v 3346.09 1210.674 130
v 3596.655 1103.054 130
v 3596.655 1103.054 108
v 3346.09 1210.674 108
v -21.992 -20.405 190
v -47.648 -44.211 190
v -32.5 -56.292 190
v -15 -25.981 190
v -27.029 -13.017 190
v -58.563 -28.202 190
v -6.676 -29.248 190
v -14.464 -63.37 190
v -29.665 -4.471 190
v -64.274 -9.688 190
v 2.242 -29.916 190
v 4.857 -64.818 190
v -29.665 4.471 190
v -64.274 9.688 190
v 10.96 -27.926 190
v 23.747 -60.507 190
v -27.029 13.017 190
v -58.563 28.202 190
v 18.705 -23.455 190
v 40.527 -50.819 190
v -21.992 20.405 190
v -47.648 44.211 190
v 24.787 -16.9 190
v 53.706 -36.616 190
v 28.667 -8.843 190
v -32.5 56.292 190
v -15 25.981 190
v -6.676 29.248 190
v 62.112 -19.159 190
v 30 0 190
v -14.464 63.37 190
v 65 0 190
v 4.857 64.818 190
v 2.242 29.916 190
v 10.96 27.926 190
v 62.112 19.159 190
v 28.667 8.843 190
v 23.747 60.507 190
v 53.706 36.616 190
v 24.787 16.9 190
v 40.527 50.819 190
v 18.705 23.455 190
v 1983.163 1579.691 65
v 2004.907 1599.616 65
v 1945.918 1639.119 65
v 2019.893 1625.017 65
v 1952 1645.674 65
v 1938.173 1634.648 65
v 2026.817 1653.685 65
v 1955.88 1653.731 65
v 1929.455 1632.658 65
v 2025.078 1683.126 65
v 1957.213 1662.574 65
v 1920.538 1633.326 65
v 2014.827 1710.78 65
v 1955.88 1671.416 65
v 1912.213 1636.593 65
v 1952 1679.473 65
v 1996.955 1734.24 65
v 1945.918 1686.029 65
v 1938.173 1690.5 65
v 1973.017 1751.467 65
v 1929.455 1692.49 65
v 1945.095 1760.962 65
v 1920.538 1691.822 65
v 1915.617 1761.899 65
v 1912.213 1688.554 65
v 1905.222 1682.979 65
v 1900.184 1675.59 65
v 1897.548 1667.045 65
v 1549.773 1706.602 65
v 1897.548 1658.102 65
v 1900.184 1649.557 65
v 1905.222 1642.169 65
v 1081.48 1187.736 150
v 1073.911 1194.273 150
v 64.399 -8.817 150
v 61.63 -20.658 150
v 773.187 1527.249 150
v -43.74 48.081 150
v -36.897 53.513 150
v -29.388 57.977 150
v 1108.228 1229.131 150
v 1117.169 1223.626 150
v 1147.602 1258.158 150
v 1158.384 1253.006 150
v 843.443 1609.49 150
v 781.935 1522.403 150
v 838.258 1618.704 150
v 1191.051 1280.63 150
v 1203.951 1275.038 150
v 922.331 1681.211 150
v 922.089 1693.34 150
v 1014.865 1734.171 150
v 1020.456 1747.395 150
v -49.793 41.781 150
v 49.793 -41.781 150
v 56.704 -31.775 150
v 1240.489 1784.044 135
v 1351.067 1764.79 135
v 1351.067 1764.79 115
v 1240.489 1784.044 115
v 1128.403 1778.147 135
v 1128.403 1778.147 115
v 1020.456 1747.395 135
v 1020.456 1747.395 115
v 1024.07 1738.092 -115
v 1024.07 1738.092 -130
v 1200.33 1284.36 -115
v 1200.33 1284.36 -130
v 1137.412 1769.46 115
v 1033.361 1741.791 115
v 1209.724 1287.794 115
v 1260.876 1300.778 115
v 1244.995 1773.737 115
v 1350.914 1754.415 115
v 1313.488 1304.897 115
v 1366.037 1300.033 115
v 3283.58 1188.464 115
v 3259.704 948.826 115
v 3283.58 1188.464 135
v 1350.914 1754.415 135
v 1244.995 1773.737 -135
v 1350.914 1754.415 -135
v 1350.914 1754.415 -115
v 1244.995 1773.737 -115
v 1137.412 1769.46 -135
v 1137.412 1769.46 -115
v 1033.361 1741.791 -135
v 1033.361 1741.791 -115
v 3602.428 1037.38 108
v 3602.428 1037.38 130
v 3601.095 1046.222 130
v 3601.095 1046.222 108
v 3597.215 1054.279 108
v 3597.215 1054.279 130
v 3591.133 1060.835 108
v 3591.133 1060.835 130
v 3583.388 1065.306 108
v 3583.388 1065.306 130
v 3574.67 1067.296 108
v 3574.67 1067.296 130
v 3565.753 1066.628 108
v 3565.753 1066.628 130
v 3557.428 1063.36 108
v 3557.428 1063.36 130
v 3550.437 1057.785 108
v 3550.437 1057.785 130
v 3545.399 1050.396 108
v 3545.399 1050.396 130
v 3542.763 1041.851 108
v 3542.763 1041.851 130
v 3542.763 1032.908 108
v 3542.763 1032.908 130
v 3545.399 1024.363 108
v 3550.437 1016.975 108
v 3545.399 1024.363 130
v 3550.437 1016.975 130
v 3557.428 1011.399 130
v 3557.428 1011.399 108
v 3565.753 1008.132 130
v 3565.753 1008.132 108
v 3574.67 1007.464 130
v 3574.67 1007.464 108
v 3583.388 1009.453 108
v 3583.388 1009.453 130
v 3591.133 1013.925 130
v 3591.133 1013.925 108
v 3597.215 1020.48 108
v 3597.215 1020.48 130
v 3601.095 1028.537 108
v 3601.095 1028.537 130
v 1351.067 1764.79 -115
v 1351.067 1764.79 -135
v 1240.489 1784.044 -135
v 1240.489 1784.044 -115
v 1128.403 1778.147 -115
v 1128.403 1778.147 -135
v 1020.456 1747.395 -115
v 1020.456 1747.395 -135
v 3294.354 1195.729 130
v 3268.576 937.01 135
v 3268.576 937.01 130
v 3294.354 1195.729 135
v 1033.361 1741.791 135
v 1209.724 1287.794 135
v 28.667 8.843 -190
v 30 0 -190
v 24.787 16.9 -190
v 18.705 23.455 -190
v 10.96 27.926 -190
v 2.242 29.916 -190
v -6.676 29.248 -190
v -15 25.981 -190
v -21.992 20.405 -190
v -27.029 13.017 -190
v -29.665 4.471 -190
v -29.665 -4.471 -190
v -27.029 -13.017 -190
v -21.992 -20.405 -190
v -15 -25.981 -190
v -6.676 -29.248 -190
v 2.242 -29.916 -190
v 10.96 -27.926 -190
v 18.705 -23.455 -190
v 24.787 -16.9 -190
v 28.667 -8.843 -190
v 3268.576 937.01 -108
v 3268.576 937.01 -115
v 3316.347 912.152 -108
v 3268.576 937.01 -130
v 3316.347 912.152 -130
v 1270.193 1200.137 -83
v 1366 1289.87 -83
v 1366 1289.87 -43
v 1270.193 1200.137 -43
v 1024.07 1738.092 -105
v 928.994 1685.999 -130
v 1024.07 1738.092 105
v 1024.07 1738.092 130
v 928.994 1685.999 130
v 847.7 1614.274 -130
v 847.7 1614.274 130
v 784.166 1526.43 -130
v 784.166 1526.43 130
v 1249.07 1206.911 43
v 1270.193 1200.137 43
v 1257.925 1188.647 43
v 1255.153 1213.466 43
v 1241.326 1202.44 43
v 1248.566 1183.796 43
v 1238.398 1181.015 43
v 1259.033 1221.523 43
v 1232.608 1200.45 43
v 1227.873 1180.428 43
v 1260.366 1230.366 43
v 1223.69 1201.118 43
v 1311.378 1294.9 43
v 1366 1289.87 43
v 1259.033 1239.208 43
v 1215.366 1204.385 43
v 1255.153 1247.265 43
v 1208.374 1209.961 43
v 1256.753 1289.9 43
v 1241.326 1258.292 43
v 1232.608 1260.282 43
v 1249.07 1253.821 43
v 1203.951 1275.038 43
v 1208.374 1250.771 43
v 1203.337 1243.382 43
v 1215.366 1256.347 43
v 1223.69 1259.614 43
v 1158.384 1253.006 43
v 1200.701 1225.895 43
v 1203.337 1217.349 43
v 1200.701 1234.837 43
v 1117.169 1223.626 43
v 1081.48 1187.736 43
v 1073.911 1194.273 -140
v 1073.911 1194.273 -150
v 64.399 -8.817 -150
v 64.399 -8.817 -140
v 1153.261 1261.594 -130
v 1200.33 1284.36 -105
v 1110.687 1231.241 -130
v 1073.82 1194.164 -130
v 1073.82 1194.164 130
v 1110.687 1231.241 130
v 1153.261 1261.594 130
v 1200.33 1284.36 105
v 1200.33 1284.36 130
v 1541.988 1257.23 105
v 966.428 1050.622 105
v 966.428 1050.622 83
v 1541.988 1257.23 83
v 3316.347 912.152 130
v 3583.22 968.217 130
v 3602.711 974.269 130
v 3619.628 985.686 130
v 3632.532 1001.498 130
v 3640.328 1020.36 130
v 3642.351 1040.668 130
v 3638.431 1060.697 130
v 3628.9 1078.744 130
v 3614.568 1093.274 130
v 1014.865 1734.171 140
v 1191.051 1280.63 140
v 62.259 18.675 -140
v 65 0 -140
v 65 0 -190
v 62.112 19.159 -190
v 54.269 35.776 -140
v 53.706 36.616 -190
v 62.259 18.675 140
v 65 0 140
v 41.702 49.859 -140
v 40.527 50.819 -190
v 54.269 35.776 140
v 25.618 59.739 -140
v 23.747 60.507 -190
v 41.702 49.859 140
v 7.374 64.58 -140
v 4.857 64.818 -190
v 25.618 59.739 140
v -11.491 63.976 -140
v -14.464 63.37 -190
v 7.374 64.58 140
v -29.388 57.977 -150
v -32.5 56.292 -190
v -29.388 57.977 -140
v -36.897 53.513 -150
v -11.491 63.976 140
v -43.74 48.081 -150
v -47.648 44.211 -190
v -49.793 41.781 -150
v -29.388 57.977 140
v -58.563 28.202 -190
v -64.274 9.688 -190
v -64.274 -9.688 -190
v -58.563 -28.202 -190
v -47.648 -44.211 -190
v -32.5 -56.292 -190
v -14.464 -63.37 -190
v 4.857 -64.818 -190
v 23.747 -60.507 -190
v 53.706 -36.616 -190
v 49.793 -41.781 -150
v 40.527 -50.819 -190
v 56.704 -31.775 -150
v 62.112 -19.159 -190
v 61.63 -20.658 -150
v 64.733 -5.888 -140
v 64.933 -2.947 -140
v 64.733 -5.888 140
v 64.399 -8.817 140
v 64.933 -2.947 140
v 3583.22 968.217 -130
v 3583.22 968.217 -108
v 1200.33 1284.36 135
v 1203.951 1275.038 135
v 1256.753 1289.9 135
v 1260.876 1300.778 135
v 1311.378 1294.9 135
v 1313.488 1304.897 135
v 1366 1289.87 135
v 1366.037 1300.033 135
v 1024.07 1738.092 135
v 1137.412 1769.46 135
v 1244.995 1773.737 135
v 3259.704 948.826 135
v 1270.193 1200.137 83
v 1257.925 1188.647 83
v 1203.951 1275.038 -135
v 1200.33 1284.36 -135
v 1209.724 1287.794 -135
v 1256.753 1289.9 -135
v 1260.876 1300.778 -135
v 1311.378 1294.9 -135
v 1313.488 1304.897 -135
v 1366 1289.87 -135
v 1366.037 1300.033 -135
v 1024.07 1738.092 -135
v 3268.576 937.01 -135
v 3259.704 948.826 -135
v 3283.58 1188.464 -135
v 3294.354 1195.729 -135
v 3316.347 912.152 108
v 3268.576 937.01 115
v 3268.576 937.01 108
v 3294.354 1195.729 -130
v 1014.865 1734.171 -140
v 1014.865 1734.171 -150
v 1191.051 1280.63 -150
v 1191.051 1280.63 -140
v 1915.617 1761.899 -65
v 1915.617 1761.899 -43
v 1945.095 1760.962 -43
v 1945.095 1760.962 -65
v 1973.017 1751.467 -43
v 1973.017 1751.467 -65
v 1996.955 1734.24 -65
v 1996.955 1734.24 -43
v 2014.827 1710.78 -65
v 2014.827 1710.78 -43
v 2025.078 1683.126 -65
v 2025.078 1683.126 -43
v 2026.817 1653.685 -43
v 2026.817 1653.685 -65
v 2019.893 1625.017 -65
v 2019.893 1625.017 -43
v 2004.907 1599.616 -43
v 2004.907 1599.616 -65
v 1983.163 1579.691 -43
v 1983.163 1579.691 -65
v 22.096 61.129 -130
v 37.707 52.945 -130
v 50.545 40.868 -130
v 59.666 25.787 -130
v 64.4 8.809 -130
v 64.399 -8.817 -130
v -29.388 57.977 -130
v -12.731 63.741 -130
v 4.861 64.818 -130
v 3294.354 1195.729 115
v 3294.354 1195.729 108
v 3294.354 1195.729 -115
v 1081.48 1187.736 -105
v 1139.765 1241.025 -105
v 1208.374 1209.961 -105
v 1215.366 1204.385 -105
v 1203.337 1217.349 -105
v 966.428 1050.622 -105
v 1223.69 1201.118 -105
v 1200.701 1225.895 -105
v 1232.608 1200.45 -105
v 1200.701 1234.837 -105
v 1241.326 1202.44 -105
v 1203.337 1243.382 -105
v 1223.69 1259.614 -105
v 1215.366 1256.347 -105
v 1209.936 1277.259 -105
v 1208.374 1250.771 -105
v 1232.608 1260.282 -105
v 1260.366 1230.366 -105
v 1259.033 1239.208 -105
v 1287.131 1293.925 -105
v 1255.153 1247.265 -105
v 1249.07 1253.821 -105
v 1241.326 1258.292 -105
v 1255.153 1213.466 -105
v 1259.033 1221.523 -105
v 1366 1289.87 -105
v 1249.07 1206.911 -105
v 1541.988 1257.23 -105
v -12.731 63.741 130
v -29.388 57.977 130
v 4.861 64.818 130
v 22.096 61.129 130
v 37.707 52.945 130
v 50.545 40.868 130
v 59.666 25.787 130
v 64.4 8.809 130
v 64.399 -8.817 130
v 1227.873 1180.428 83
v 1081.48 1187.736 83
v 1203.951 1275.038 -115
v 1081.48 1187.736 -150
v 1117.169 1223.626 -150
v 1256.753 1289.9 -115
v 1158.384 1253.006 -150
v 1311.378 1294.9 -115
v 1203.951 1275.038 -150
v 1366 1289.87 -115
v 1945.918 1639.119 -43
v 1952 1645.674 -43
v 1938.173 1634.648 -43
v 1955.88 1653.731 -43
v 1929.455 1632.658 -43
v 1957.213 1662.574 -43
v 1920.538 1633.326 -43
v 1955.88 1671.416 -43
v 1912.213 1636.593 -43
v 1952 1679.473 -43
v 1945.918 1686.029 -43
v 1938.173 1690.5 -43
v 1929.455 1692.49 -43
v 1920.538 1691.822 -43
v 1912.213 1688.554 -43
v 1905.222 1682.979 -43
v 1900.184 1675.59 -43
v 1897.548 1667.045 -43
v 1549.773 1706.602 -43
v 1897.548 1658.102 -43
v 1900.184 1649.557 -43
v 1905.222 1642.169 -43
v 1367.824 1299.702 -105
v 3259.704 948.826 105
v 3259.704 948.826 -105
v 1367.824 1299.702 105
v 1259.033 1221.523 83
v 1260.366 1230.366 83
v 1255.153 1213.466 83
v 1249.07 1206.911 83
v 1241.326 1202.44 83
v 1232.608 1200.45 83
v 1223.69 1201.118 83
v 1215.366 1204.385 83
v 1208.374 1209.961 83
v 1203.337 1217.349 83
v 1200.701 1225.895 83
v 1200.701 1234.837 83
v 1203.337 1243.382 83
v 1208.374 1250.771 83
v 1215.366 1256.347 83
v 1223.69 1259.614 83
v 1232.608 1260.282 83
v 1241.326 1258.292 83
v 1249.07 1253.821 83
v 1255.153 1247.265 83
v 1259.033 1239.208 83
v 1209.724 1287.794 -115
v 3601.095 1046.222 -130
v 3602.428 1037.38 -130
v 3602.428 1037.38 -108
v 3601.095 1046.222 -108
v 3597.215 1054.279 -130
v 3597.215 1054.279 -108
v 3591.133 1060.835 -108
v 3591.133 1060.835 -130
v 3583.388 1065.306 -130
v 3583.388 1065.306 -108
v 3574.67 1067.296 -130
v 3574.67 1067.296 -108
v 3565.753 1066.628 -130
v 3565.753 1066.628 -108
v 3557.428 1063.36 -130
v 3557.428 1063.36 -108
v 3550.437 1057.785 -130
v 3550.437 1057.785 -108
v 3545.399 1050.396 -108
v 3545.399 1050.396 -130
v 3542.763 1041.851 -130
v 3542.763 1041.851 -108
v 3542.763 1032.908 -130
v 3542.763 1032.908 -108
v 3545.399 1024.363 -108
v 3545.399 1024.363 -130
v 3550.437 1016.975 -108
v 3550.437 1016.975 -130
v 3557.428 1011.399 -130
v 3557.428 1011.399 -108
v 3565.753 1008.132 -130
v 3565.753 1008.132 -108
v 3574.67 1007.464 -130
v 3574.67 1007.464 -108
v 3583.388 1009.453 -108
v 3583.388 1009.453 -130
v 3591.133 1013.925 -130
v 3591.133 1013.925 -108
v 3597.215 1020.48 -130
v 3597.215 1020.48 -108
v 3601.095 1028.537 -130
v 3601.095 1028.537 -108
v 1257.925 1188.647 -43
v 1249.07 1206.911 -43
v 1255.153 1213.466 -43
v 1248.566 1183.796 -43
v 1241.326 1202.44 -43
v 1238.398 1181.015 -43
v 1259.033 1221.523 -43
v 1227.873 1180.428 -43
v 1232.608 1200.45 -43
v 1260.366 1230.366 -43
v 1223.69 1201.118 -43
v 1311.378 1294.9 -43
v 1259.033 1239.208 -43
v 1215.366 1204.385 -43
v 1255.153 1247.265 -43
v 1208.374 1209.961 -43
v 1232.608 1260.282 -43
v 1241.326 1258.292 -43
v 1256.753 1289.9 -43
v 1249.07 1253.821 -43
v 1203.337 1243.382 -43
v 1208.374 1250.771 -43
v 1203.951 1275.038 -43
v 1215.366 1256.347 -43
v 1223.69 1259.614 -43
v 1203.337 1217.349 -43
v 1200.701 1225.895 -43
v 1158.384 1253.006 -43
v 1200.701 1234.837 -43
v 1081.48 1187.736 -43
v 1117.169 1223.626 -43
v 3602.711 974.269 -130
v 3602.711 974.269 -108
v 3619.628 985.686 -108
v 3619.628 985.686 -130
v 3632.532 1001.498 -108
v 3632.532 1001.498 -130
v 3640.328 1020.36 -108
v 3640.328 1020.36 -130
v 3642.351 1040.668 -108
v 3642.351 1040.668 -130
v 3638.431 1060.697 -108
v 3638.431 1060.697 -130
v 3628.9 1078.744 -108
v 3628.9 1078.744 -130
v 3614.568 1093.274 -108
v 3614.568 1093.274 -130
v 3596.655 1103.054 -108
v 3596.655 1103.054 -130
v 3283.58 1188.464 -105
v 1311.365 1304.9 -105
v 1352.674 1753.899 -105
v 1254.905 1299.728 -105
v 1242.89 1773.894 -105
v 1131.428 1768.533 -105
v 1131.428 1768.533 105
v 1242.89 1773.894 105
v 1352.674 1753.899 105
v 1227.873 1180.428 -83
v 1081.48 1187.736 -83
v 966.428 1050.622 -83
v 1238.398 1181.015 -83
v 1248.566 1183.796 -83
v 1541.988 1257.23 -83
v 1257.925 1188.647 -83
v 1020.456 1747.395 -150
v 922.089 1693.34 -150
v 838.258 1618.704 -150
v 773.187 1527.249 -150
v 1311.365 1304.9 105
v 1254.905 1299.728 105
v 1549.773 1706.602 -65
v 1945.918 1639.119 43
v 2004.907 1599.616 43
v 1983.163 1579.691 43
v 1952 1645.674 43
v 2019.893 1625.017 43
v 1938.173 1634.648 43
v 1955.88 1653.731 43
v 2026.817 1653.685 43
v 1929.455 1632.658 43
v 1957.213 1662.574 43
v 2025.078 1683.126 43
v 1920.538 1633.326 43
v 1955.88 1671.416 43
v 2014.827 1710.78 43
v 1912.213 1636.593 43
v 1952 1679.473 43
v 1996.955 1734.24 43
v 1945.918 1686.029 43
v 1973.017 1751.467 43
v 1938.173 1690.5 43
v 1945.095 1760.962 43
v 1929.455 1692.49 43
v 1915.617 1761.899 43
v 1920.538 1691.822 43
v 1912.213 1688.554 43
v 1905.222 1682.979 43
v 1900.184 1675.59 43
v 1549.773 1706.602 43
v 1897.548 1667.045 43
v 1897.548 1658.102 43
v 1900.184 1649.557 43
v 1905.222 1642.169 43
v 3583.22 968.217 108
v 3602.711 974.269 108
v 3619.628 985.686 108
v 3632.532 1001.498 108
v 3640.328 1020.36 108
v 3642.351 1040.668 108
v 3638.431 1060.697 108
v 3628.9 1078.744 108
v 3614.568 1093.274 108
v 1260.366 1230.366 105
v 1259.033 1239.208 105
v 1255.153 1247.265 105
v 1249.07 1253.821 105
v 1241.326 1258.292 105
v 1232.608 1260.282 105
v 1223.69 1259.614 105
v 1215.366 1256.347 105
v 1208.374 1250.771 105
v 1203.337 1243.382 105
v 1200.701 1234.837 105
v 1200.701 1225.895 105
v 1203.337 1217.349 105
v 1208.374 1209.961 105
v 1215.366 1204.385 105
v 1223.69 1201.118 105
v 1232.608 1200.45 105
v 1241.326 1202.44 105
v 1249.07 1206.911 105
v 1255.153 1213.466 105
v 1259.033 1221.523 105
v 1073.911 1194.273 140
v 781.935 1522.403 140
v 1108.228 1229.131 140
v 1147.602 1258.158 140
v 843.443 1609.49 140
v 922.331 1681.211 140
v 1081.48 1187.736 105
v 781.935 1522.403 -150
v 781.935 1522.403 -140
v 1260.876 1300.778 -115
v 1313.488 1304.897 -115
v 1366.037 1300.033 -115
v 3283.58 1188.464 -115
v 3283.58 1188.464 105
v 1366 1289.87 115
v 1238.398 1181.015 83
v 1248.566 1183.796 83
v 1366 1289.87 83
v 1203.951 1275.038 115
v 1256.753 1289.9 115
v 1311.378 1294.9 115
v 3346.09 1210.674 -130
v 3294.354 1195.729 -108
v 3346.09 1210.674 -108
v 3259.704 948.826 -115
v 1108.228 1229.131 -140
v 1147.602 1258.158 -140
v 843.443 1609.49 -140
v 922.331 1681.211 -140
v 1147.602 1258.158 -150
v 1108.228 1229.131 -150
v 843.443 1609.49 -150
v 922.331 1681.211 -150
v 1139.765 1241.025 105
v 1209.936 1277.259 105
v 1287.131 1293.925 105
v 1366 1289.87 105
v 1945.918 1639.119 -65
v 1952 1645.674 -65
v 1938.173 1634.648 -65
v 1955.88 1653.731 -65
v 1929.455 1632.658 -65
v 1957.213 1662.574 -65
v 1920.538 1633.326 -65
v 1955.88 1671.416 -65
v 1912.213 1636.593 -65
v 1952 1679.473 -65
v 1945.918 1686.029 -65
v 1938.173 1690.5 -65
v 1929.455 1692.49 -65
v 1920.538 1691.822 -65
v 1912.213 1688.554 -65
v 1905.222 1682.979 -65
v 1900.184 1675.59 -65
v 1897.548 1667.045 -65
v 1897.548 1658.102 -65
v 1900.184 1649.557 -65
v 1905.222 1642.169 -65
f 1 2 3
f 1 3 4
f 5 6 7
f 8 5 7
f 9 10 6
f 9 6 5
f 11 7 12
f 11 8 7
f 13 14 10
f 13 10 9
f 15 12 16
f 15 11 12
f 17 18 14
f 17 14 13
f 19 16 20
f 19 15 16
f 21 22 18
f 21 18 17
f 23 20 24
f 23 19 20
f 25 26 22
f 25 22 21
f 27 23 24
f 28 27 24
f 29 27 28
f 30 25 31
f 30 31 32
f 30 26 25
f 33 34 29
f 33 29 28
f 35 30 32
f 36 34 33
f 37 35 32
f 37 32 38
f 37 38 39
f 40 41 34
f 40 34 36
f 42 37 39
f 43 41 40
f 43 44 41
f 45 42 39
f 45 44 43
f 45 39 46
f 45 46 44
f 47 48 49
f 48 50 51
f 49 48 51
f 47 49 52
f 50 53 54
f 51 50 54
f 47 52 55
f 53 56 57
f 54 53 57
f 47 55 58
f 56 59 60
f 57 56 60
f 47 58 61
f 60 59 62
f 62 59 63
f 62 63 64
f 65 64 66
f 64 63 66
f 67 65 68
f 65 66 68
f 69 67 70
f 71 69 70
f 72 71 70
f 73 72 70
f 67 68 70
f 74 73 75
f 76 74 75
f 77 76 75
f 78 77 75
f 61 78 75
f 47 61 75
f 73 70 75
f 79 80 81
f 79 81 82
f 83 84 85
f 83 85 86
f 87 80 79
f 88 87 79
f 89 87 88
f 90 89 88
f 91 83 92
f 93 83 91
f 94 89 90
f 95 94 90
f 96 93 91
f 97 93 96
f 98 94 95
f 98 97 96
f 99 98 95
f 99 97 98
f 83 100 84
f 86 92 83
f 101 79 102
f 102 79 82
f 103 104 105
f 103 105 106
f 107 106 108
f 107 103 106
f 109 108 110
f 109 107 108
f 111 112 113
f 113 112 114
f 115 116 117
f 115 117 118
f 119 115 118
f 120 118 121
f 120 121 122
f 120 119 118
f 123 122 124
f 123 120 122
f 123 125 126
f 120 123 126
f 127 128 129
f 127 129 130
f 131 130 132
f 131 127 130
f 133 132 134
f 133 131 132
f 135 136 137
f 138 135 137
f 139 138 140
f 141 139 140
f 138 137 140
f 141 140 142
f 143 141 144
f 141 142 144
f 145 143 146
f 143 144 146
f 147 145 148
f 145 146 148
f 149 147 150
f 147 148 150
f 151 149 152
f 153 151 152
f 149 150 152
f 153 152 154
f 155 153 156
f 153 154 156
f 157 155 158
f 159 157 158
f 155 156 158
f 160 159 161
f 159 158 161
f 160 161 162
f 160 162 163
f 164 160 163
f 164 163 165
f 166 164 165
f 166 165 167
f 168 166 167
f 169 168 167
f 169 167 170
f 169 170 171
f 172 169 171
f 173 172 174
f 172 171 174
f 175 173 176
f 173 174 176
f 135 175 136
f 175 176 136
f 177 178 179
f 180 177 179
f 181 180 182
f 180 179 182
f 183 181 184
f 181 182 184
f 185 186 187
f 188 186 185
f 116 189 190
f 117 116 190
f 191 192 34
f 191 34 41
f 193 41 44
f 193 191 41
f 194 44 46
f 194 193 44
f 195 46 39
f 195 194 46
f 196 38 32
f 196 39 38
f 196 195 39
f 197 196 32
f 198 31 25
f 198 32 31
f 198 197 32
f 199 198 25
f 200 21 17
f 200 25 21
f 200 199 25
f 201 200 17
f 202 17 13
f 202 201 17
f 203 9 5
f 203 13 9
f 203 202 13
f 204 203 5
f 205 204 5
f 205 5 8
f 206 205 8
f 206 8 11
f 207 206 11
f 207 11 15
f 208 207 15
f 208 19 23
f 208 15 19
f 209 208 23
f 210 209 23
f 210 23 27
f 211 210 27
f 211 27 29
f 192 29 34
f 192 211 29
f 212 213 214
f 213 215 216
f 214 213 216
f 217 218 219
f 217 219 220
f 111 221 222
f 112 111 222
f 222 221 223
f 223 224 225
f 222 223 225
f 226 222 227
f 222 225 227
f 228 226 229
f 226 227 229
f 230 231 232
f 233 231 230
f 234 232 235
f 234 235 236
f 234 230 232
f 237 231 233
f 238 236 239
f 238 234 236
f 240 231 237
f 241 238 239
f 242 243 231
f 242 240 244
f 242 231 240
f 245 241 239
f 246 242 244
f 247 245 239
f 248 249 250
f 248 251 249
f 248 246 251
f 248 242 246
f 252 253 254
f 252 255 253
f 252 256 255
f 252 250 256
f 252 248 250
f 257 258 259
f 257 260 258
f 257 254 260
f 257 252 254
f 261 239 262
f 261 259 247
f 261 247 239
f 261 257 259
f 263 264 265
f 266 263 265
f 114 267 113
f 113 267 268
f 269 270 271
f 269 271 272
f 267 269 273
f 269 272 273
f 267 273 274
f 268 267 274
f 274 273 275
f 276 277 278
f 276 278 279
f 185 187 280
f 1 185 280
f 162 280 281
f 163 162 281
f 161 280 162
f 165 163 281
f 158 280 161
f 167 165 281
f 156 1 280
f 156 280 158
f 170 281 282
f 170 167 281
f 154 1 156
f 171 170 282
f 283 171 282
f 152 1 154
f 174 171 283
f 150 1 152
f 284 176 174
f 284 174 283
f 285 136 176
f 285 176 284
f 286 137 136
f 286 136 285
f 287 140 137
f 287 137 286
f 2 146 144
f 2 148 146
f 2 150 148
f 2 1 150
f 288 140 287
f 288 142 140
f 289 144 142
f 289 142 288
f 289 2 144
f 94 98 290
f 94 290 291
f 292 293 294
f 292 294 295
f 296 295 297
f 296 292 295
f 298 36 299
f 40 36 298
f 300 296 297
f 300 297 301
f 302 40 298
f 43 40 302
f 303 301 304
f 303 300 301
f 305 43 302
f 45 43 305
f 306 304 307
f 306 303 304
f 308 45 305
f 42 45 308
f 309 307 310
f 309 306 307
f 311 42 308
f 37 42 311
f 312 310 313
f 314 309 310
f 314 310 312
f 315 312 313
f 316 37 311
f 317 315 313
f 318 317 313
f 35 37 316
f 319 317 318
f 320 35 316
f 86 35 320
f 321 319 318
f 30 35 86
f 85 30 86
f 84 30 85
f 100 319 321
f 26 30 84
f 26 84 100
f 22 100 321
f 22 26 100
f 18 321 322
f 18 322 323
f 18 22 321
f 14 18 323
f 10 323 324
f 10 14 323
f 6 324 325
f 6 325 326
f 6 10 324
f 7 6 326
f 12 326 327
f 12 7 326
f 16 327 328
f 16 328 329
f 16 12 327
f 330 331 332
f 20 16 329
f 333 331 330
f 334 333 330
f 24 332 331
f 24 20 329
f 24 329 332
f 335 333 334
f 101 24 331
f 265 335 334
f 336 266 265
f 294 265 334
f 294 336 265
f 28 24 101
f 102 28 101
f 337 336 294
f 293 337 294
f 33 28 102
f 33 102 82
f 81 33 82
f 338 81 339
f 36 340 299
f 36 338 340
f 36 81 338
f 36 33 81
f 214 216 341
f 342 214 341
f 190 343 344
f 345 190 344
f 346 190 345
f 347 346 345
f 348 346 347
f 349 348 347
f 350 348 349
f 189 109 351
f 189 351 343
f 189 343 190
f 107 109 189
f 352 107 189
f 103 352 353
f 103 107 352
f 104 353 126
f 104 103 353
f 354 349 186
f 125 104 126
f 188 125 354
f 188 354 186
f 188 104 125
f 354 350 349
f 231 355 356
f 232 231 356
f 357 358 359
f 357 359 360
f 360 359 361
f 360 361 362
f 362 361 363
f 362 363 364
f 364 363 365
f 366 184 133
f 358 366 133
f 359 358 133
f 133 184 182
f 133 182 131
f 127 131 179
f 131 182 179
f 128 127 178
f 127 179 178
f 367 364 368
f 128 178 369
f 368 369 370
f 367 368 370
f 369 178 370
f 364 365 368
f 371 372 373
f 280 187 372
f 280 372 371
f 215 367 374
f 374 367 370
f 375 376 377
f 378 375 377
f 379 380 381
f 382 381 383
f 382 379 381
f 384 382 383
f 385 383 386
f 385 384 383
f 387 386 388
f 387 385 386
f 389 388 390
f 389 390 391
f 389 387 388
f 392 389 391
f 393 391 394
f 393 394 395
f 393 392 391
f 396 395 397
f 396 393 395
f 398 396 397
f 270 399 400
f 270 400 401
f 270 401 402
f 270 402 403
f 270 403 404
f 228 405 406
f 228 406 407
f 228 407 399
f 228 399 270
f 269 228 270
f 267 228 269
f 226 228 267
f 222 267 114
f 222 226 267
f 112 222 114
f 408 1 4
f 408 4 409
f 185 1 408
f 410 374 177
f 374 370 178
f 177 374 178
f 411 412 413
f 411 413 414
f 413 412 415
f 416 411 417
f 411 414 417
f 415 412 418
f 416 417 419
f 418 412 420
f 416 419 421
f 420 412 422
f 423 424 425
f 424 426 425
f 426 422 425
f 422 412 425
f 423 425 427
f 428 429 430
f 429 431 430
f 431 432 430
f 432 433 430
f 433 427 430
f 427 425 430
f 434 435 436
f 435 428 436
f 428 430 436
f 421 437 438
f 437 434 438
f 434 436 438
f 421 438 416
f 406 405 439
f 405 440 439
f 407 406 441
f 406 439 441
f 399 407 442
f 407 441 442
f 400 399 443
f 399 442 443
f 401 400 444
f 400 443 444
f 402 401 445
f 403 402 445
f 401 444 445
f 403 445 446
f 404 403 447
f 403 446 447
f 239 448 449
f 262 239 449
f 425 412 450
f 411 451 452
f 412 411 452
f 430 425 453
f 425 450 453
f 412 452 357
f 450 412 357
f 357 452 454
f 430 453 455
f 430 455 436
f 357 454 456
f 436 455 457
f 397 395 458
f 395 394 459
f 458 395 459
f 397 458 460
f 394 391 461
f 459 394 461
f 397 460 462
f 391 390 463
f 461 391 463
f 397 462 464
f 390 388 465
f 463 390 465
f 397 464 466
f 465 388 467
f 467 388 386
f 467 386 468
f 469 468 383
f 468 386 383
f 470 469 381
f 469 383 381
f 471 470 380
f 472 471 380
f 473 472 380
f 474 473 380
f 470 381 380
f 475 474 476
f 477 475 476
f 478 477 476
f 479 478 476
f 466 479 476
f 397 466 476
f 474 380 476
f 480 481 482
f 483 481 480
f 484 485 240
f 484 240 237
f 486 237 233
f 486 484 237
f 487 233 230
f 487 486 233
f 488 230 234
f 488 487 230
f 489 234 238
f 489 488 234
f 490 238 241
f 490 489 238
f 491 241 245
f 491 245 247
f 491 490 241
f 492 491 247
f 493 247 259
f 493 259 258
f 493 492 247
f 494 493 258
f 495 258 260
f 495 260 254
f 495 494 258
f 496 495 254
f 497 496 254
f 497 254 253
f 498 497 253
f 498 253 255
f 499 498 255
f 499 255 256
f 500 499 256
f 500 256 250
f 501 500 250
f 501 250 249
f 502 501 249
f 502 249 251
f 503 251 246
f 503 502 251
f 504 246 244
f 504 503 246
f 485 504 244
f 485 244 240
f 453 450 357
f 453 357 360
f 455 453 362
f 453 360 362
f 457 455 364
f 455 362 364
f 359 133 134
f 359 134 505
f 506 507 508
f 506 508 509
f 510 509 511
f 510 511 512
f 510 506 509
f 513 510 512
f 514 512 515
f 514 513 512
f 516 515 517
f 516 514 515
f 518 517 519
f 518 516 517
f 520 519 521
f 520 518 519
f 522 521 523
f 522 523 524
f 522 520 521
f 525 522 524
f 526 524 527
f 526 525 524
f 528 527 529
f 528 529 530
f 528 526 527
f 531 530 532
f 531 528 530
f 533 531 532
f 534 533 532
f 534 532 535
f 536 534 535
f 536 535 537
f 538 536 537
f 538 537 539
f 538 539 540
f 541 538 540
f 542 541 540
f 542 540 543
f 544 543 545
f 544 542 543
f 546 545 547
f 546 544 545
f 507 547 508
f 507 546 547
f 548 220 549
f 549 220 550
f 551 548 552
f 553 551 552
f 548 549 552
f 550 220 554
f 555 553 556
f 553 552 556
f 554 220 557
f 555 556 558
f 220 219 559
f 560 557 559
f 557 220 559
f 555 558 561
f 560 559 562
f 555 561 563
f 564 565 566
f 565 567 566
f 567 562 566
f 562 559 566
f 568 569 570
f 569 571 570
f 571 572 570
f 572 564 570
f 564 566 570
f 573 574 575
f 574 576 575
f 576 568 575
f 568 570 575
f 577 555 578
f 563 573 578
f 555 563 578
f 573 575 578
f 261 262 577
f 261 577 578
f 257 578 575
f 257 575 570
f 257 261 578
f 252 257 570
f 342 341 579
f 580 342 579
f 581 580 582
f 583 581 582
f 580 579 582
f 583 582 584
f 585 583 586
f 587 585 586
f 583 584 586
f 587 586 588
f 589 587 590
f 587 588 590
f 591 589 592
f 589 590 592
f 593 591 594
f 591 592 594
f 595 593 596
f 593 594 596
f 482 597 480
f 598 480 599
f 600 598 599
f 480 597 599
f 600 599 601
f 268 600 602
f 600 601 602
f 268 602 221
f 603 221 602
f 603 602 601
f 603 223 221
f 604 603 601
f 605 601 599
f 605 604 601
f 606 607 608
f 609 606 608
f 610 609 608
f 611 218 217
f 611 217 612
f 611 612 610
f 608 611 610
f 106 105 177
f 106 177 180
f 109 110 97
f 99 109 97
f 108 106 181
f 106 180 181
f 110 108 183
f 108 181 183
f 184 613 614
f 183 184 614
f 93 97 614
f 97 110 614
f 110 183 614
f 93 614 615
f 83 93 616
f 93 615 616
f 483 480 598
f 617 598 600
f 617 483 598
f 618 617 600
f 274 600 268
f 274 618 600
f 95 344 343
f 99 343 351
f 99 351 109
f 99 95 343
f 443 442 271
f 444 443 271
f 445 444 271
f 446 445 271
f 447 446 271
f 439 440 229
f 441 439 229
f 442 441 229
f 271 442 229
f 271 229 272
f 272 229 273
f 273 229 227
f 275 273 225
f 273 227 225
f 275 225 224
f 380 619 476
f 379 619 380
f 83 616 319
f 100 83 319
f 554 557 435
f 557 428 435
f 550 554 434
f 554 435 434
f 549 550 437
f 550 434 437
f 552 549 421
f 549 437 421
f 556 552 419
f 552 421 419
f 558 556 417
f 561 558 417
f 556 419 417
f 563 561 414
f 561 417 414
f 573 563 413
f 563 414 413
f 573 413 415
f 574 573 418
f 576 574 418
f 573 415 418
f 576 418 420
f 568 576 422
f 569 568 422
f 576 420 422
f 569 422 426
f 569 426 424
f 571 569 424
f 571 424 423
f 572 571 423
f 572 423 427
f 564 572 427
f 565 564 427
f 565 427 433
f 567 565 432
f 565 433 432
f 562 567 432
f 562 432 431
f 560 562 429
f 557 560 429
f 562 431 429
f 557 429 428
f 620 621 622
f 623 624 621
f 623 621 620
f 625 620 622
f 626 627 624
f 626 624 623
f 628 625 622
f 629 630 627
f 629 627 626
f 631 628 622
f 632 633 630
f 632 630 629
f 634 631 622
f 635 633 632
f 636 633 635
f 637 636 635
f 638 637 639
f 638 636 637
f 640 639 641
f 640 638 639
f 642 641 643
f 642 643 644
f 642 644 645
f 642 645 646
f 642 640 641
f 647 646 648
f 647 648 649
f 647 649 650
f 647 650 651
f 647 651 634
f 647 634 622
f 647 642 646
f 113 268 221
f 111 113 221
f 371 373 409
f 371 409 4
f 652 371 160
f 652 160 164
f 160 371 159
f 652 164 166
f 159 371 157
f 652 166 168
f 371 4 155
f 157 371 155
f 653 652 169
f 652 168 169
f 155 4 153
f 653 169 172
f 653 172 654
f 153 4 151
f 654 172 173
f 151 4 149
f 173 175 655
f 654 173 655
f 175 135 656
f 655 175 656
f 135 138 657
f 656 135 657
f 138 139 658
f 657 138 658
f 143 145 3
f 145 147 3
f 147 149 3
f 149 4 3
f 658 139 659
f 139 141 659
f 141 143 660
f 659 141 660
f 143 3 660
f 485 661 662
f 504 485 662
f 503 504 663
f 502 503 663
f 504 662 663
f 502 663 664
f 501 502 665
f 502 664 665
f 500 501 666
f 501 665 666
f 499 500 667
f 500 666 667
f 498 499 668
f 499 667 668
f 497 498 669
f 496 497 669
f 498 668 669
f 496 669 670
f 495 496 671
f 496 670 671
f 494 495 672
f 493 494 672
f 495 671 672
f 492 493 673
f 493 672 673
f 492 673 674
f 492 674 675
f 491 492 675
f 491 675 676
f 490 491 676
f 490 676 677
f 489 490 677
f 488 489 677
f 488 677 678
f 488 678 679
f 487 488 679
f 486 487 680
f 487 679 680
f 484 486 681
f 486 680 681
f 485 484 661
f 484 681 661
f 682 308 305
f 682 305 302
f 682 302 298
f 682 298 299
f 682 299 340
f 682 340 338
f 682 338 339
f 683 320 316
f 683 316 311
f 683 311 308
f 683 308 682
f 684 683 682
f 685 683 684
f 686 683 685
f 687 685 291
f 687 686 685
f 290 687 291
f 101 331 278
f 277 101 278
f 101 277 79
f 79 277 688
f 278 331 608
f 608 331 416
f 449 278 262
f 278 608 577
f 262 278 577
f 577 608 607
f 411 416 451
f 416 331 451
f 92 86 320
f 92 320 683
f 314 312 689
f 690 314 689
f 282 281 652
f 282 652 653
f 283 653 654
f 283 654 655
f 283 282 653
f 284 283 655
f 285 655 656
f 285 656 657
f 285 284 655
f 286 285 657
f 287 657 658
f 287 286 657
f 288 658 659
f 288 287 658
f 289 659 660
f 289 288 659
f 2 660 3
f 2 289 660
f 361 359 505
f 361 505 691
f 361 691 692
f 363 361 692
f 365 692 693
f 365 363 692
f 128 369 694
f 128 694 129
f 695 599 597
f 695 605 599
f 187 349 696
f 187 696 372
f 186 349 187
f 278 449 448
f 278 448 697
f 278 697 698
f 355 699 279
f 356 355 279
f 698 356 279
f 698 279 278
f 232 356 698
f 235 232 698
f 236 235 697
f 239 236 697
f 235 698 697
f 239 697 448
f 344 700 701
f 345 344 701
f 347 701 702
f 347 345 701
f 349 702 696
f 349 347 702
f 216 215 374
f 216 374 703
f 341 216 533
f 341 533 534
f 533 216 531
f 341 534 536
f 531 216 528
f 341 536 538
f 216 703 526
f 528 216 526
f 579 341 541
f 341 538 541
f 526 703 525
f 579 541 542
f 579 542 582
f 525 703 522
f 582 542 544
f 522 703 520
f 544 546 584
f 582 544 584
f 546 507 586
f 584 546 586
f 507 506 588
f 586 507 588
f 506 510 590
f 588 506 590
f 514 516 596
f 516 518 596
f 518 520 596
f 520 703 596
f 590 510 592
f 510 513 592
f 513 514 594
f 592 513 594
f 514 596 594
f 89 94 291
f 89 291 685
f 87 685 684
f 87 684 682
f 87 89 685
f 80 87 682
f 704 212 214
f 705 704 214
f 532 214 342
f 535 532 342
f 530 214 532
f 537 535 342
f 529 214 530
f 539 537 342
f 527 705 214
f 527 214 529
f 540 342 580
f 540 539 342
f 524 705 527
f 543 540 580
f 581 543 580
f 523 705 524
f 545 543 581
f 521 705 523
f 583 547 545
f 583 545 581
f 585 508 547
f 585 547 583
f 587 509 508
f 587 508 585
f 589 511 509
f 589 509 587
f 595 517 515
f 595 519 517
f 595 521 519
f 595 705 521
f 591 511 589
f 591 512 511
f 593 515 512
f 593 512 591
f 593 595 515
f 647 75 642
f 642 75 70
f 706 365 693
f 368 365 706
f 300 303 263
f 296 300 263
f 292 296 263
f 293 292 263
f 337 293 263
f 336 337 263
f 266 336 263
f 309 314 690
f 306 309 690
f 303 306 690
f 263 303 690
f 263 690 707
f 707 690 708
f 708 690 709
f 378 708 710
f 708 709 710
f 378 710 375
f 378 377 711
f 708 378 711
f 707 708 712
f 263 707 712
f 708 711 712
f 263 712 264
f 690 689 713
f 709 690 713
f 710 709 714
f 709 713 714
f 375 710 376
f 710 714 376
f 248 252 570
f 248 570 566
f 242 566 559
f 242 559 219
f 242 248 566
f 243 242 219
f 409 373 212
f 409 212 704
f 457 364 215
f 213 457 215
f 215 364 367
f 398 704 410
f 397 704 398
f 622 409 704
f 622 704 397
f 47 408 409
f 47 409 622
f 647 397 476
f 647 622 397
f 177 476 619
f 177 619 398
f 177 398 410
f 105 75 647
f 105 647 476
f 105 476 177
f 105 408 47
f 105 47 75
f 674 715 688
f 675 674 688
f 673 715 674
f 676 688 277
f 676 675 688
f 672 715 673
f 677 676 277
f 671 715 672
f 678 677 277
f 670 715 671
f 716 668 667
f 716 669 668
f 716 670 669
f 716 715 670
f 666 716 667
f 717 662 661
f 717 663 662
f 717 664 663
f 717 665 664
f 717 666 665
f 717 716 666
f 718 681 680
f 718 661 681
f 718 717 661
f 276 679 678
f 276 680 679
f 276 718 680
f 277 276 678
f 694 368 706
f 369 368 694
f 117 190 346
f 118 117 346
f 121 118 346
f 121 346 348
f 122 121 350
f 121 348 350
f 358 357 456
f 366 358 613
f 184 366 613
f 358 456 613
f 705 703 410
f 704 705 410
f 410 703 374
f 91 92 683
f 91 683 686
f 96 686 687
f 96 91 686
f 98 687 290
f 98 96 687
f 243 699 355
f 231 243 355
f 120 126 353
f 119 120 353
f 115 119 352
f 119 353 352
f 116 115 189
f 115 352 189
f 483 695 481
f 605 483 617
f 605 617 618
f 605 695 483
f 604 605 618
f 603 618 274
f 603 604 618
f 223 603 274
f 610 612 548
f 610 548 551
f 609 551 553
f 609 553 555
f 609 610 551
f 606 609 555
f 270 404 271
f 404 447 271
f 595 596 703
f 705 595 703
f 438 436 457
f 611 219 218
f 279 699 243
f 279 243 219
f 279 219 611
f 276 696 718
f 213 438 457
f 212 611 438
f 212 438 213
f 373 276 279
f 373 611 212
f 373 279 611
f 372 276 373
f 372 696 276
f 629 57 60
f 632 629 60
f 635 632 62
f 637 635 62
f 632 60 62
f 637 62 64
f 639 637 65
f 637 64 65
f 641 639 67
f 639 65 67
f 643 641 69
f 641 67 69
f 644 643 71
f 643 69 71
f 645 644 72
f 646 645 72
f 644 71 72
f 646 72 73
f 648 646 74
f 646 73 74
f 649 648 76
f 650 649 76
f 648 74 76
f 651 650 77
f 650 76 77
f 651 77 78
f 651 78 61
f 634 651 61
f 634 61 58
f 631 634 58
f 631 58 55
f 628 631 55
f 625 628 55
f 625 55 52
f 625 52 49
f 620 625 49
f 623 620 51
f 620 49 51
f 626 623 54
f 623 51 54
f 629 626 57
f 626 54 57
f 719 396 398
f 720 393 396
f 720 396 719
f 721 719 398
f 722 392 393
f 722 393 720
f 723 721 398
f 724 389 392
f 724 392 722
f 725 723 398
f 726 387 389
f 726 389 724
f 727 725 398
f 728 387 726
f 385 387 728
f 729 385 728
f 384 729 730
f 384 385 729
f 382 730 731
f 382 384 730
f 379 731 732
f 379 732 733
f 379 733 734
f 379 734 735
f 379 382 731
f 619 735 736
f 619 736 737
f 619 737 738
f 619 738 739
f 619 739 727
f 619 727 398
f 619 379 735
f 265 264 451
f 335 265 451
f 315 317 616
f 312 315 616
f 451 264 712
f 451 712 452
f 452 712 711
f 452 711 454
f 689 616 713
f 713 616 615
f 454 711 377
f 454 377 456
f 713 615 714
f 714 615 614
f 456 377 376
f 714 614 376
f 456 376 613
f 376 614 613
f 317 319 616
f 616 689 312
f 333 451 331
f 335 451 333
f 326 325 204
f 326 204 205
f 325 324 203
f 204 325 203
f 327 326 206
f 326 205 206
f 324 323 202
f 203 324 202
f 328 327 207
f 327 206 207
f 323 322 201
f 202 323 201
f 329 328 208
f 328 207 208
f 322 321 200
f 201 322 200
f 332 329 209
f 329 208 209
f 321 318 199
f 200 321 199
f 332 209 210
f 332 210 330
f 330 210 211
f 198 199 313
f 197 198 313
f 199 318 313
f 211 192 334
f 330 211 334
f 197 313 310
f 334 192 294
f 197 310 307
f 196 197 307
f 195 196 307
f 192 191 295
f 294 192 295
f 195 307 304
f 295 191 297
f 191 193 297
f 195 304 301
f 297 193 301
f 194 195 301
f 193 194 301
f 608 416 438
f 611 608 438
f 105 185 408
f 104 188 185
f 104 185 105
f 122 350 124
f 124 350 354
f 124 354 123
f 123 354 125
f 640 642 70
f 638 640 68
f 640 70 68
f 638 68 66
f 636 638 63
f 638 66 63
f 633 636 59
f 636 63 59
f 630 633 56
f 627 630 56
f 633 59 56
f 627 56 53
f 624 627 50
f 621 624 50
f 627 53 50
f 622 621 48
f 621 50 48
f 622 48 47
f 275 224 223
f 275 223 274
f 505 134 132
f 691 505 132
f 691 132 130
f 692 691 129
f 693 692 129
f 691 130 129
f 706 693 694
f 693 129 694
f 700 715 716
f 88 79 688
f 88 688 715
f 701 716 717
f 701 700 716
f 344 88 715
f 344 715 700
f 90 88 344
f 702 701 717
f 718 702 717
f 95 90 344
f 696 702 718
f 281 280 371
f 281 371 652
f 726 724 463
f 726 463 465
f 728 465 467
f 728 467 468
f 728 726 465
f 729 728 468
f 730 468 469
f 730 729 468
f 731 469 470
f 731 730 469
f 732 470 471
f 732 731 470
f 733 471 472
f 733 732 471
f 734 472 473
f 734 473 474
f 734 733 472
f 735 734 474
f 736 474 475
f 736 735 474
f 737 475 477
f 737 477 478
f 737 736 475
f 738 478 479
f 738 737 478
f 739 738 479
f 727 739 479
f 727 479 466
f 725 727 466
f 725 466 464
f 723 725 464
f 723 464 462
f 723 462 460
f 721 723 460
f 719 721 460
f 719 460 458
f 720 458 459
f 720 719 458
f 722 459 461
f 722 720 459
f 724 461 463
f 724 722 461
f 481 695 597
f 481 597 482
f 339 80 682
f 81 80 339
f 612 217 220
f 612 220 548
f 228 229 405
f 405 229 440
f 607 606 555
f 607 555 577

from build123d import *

# Parameters (mm, degrees)
BOSS_EXTRUDE1_DEPTH     = 140
BOSS_EXTRUDE2_DEPTH     = 190
BOSS_EXTRUDE3_DEPTH     = 115
SKETCH2_R               = 29.999999999999844
BOSS_EXTRUDE4_DEPTH     = 22
SKETCH4_R               = 30.000000000000057
BOSS_EXTRUDE5_DEPTH     = 22
SKETCH5_R               = 30.000000000000057
BOSS_EXTRUDE6_DEPTH     = 22
CUT_EXTRUDE1_DEPTH      = 4061.7139365889066
CUT_EXTRUDE1_DEPTH_BACK = 4061.7139365889066
SKETCH6_R               = 30
CUT_EXTRUDE2_DEPTH      = 105
CUT_EXTRUDE3_DEPTH      = 130
SKETCH9_R               = 30.000000000000057
BOSS_EXTRUDE8_DEPTH     = 40
BOSS_EXTRUDE9_START     = 10
BOSS_EXTRUDE9_DEPTH     = 10
BOSS_EXTRUDE10_START    = 20
BOSS_EXTRUDE10_DEPTH    = 20


with BuildPart() as part:
    # Sketch1 → Boss-Extrude1 (new, symmetric)
    with BuildSketch(Plane.XY):
        with BuildLine():
            ThreePointArc((65, -1.592e-14), (61.080020351084045, -22.23130931616846), (49.792888802733636, -41.781194629624984))
            Line((49.79288880273364, -41.78119462962495), (1081.4804368301984, 1187.7361471668223))
            ThreePointArc((1081.4804368301984, 1187.7361471668223), (1137.156074050822, 1239.1867098564549), (1203.951248641351, 1275.038371358024))
            Line((1203.9512486413507, 1275.0383713580243), (1020.4560106462599, 1747.3953623265181))
            ThreePointArc((1020.4560106462598, 1747.3953623265184), (878.0721607669617, 1658.3818553513138), (773.1873129694607, 1527.2493504832594))
            Line((773.1873129694607, 1527.2493504832594), (-49.792888802733614, 41.781194629624906))
            ThreePointArc((-49.792888802733636, 41.78119462962498), (22.23130931616842, 61.08002035108406), (65, 0))
        make_face()
    extrude(amount=BOSS_EXTRUDE1_DEPTH, both=True)

    # Sketch1<3> → Boss-Extrude2 (add, symmetric)
    with BuildSketch(Plane.XY):
        with BuildLine():
            ThreePointArc((-49.792888802733636, 41.78119462962498), (-41.78119462962498, -49.792888802733636), (49.792888802733636, -41.781194629624984))
            ThreePointArc((49.792888802733636, -41.781194629624984), (61.080020351084045, -22.23130931616846), (65, -1.592e-14))
            ThreePointArc((65, 0), (22.23130931616842, 61.08002035108406), (-49.792888802733636, 41.78119462962498))
        make_face()
    extrude(amount=BOSS_EXTRUDE2_DEPTH, both=True)

    # Sketch1<4> → Boss-Extrude3 (add, symmetric)
    with BuildSketch(Plane.XY):
        with BuildLine():
            Line((1020.4560106462599, 1747.3953623265181), (1203.9512486413507, 1275.0383713580243))
            ThreePointArc((1203.951248641351, 1275.038371358024), (1283.9508361288626, 1293.6512056471731), (1366.0000412931197, 1289.8697336638038))
            Line((1366.0000412931197, 1289.8697336638038), (3268.576248845471, 937.0104710473246))
            Line((3268.576248845471, 937.0104710473246), (3294.3538500413274, 1195.729460061636))
            Line((3294.3538500413274, 1195.729460061636), (1351.066804500354, 1764.790142245739))
            ThreePointArc((1351.066804500354, 1764.790142245739), (1184.2799206207571, 1784.2503708211993), (1020.4560106462598, 1747.3953623265184))
        make_face()
    extrude(amount=BOSS_EXTRUDE3_DEPTH, both=True)

    # Sketch2 → Boss-Extrude4 (add)
    with BuildSketch(Plane.XY.offset(130)):
        with BuildLine():
            Line((3316.347008179312, 912.1517793547129), (3583.220413673133, 968.2166417593702))
            ThreePointArc((3583.220413673133, 968.2166417593702), (3642.083328680258, 1030.4395755142295), (3596.6549667093313, 1103.0536249594716))
            Line((3596.6549667093313, 1103.0536249594716), (3346.0903941745296, 1210.6736897558415))
            Line((3346.0903941745296, 1210.6736897558415), (3294.3538500413274, 1195.7294600616358))
            Line((3294.3538500413274, 1195.7294600616358), (3268.5762488454716, 937.0104710473244))
            Line((3268.5762488454716, 937.0104710473244), (3316.347008179312, 912.1517793547129))
        make_face()
        with Locations((3572.428216253328, 1037.3796989131135)):
            Circle(SKETCH2_R, mode=Mode.SUBTRACT)
    boss_extrude4 = extrude(amount=-BOSS_EXTRUDE4_DEPTH)

    # Mirror1: Boss-Extrude4 across plane
    add(boss_extrude4.mirror(Plane.XY))

    # Sketch4 → Boss-Extrude5 (add)
    with BuildSketch(Plane.XY.offset(105)):
        with BuildLine():
            Line((1081.4804368301984, 1187.7361471668223), (966.4282906591733, 1050.6223386318286))
            Line((966.4282906591733, 1050.6223386318286), (1541.9882734825221, 1257.2302642995674))
            Line((1541.9882734825221, 1257.2302642995674), (1366.0000412931197, 1289.8697336638038))
            ThreePointArc((1366.0000412931197, 1289.8697336638038), (1209.9357996231295, 1277.2587881300008), (1081.4804368301984, 1187.7361471668223))
        make_face()
        with Locations((1230.36579926459, 1230.3657992645947)):
            Circle(SKETCH4_R, mode=Mode.SUBTRACT)
    boss_extrude5 = extrude(amount=-BOSS_EXTRUDE5_DEPTH)

    # Mirror2: Boss-Extrude5 across plane
    add(boss_extrude5.mirror(Plane.XY))

    # Sketch5 → Boss-Extrude6 (add)
    with BuildSketch(Plane.XY.offset(65)):
        with BuildLine():
            Line((1549.7725074062366, 1706.602339723742), (1915.617102975737, 1761.8991017680858))
            ThreePointArc((1915.617102975737, 1761.8991017680858), (2020.9777520024375, 1697.3330400459488), (1983.1632899241847, 1579.6907468543984))
            Line((1983.1632899241847, 1579.6907468543984), (1549.7725074062366, 1706.602339723742))
        make_face()
        with Locations((1927.2132062202722, 1662.5737254056373)):
            Circle(SKETCH5_R, mode=Mode.SUBTRACT)
    boss_extrude6 = extrude(amount=-BOSS_EXTRUDE6_DEPTH)

    # Mirror3: Boss-Extrude6 across plane
    add(boss_extrude6.mirror(Plane.XY))

    # Sketch6 → Cut-Extrude1 (cut, two sides: drawn at the far end of the back side and taken through both)
    with BuildSketch(Plane.XY.offset(-CUT_EXTRUDE1_DEPTH_BACK)):
        Circle(SKETCH6_R)
    extrude(amount=CUT_EXTRUDE1_DEPTH + CUT_EXTRUDE1_DEPTH_BACK, mode=Mode.SUBTRACT)

    # Sketch7 → Cut-Extrude2 (cut, symmetric)
    with BuildSketch(Plane.XY):
        with BuildLine():
            Line((1024.0699284450966, 1738.0923452252694), (1200.3301627751682, 1284.3598406368847))
            ThreePointArc((1200.3301627751682, 1284.3598406368847), (1283.0164749646392, 1303.6074841841842), (1367.8235836773604, 1299.702062643902))
            Line((1367.8235836773604, 1299.702062643902), (3259.704029255034, 948.8264780890555))
            Line((3259.704029255034, 948.8264780890555), (3283.580471521982, 1188.4643310307968))
            Line((3283.580471521982, 1188.4643310307968), (1352.6744523210061, 1753.8994267060289))
            ThreePointArc((1352.6744523210061, 1753.8994267060289), (1213.394373329098, 1774.9543699676724), (1073.8793026905835, 1755.51739220688))
            ThreePointArc((1073.8793026905835, 1755.51739220688), (1048.7398871235857, 1747.4758383231158), (1024.0699284450966, 1738.0923452252696))
        make_face()
    extrude(amount=CUT_EXTRUDE2_DEPTH, both=True, mode=Mode.SUBTRACT)

    # Sketch7<3> → Cut-Extrude3 (cut, symmetric)
    with BuildSketch(Plane.XY):
        with BuildLine():
            ThreePointArc((1073.8199923990087, 1194.1640232636878), (1131.3327348933467, 1247.316238388219), (1200.3301627751682, 1284.3598406368847))
            Line((1200.3301627751682, 1284.3598406368847), (1024.0699284450966, 1738.0923452252694))
            ThreePointArc((1024.0699284450966, 1738.0923452252696), (886.3572203673968, 1652.3914458778913), (784.1655123326112, 1526.4299877886158))
            Line((784.1655123326113, 1526.4299877886158), (-29.387821008213336, 57.97720221250097))
            ThreePointArc((-29.387821008213336, 57.97720221250086), (37.706877201397155, 52.94517363951841), (64.39926034060059, -8.816760606002008))
            Line((64.39926034060059, -8.816760606001992), (1073.8199923990087, 1194.1640232636878))
        make_face()
    extrude(amount=CUT_EXTRUDE3_DEPTH, both=True, mode=Mode.SUBTRACT)

    # Sketch9 → Boss-Extrude8 (add)
    with BuildSketch(Plane(origin=(0, 0, 82.99999999999999), x_dir=(-1, 0, 0), z_dir=(0, 0, -1))):
        with BuildLine():
            ThreePointArc((-1257.9248669828, 1188.6465257030486), (-1243.5553130328078, 1182.1367963041562), (-1227.8728186550686, 1180.4279874615074))
            Line((-1227.8728186550686, 1180.4279874615074), (-1081.4804368301982, 1187.736147166822))
            ThreePointArc((-1081.4804368301982, 1187.736147166822), (-1209.9357996231292, 1277.258788130001), (-1366.00004129312, 1289.8697336638038))
            Line((-1366.0000412931197, 1289.8697336638038), (-1257.9248669827998, 1188.6465257030488))
        make_face()
        with Locations((-1230.36579926459, 1230.3657992645947)):
            Circle(SKETCH9_R, mode=Mode.SUBTRACT)
    boss_extrude8 = extrude(amount=BOSS_EXTRUDE8_DEPTH)

    # Mirror5: Boss-Extrude8 across plane
    add(boss_extrude8.mirror(Plane.XY))

    # Sketch10 → Boss-Extrude9 (add)
    with BuildSketch(Plane.XY.offset(140).offset(BOSS_EXTRUDE9_START)):
        with BuildLine():
            ThreePointArc((1081.4804368301982, 1187.736147166822), (1137.156074050822, 1239.186709856455), (1203.951248641351, 1275.0383713580243))
            Line((1203.951248641351, 1275.0383713580243), (1020.4560106462601, 1747.3953623265181))
            ThreePointArc((1020.4560106462601, 1747.3953623265181), (878.072160766962, 1658.3818553513136), (773.1873129694607, 1527.2493504832594))
            Line((773.1873129694607, 1527.2493504832594), (-49.7928888027335, 41.78119462962513))
            ThreePointArc((-49.79288880273354, 41.781194629625126), (-40.410071355387224, 50.91194489559906), (-29.387821008213336, 57.977202212500885))
            Line((-29.387821008213336, 57.97720221250097), (781.934579103123, 1522.4031834218724))
            ThreePointArc((781.9345791031229, 1522.4031834218724), (880.9305411746955, 1647.5021699961562), (1014.8653487547539, 1734.1706433119002))
            Line((1014.8653487547539, 1734.1706433119002), (1191.051052278277, 1280.6299973673715))
            ThreePointArc((1191.051052278277, 1280.6299973673717), (1127.3416356078974, 1244.4226736643095), (1073.9110640180447, 1194.2725581928576))
            Line((1073.9110640180447, 1194.2725581928576), (64.39926034060068, -8.816760606001935))
            ThreePointArc((64.3992603406006, -8.816760606001868), (59.42747856941116, -26.332010764128448), (49.79288880273364, -41.781194629624956))
            Line((49.79288880273365, -41.781194629624956), (1081.4804368301982, 1187.736147166822))
        make_face()
    boss_extrude9 = extrude(amount=-BOSS_EXTRUDE9_DEPTH)

    # Mirror6: Boss-Extrude9 across plane
    add(boss_extrude9.mirror(Plane.XY))

    # Sketch11 → Boss-Extrude10 (add)
    with BuildSketch(Plane.XY.offset(115).offset(BOSS_EXTRUDE10_START)):
        with BuildLine():
            Line((1024.0699284450966, 1738.0923452252691), (1200.3301627751687, 1284.359840636885))
            Line((1200.3301627751687, 1284.359840636885), (1203.951248641351, 1275.0383713580243))
            ThreePointArc((1203.951248641351, 1275.0383713580243), (1283.9508361288626, 1293.6512056471734), (1366.00004129312, 1289.8697336638038))
            Line((1366.00004129312, 1289.8697336638038), (3268.5762488454716, 937.0104710473244))
            Line((3268.5762488454716, 937.0104710473244), (3294.3538500413274, 1195.7294600616358))
            Line((3294.3538500413274, 1195.7294600616358), (1351.0668045003542, 1764.790142245739))
            ThreePointArc((1351.0668045003542, 1764.790142245739), (1184.2799206207574, 1784.2503708211993), (1020.4560106462601, 1747.3953623265181))
            Line((1020.4560106462601, 1747.3953623265181), (1024.0699284450966, 1738.0923452252691))
        make_face()
        with BuildLine():
            Line((3259.704029255035, 948.8264780890559), (1366.0372079275185, 1300.0333709128395))
            ThreePointArc((1366.0372079275185, 1300.0333709128395), (1287.0941128924526, 1303.959207285298), (1209.7241743097554, 1287.7939034326503))
            Line((1209.7241743097554, 1287.7939034326503), (1033.3612892265444, 1741.7906535753216))
            ThreePointArc((1033.3612892265444, 1741.7906535753216), (1191.085679257279, 1774.5620582834817), (1350.9138490858948, 1754.4149913418998))
            Line((1350.9138490858948, 1754.4149913418998), (3283.5804715219824, 1188.464331030797))
            Line((3283.5804715219824, 1188.464331030797), (3259.704029255035, 948.8264780890559))
        make_face(mode=Mode.SUBTRACT)
    boss_extrude10 = extrude(amount=-BOSS_EXTRUDE10_DEPTH)

    # Mirror7: Boss-Extrude10 across plane
    add(boss_extrude10.mirror(Plane.XY))


solid = part.part
